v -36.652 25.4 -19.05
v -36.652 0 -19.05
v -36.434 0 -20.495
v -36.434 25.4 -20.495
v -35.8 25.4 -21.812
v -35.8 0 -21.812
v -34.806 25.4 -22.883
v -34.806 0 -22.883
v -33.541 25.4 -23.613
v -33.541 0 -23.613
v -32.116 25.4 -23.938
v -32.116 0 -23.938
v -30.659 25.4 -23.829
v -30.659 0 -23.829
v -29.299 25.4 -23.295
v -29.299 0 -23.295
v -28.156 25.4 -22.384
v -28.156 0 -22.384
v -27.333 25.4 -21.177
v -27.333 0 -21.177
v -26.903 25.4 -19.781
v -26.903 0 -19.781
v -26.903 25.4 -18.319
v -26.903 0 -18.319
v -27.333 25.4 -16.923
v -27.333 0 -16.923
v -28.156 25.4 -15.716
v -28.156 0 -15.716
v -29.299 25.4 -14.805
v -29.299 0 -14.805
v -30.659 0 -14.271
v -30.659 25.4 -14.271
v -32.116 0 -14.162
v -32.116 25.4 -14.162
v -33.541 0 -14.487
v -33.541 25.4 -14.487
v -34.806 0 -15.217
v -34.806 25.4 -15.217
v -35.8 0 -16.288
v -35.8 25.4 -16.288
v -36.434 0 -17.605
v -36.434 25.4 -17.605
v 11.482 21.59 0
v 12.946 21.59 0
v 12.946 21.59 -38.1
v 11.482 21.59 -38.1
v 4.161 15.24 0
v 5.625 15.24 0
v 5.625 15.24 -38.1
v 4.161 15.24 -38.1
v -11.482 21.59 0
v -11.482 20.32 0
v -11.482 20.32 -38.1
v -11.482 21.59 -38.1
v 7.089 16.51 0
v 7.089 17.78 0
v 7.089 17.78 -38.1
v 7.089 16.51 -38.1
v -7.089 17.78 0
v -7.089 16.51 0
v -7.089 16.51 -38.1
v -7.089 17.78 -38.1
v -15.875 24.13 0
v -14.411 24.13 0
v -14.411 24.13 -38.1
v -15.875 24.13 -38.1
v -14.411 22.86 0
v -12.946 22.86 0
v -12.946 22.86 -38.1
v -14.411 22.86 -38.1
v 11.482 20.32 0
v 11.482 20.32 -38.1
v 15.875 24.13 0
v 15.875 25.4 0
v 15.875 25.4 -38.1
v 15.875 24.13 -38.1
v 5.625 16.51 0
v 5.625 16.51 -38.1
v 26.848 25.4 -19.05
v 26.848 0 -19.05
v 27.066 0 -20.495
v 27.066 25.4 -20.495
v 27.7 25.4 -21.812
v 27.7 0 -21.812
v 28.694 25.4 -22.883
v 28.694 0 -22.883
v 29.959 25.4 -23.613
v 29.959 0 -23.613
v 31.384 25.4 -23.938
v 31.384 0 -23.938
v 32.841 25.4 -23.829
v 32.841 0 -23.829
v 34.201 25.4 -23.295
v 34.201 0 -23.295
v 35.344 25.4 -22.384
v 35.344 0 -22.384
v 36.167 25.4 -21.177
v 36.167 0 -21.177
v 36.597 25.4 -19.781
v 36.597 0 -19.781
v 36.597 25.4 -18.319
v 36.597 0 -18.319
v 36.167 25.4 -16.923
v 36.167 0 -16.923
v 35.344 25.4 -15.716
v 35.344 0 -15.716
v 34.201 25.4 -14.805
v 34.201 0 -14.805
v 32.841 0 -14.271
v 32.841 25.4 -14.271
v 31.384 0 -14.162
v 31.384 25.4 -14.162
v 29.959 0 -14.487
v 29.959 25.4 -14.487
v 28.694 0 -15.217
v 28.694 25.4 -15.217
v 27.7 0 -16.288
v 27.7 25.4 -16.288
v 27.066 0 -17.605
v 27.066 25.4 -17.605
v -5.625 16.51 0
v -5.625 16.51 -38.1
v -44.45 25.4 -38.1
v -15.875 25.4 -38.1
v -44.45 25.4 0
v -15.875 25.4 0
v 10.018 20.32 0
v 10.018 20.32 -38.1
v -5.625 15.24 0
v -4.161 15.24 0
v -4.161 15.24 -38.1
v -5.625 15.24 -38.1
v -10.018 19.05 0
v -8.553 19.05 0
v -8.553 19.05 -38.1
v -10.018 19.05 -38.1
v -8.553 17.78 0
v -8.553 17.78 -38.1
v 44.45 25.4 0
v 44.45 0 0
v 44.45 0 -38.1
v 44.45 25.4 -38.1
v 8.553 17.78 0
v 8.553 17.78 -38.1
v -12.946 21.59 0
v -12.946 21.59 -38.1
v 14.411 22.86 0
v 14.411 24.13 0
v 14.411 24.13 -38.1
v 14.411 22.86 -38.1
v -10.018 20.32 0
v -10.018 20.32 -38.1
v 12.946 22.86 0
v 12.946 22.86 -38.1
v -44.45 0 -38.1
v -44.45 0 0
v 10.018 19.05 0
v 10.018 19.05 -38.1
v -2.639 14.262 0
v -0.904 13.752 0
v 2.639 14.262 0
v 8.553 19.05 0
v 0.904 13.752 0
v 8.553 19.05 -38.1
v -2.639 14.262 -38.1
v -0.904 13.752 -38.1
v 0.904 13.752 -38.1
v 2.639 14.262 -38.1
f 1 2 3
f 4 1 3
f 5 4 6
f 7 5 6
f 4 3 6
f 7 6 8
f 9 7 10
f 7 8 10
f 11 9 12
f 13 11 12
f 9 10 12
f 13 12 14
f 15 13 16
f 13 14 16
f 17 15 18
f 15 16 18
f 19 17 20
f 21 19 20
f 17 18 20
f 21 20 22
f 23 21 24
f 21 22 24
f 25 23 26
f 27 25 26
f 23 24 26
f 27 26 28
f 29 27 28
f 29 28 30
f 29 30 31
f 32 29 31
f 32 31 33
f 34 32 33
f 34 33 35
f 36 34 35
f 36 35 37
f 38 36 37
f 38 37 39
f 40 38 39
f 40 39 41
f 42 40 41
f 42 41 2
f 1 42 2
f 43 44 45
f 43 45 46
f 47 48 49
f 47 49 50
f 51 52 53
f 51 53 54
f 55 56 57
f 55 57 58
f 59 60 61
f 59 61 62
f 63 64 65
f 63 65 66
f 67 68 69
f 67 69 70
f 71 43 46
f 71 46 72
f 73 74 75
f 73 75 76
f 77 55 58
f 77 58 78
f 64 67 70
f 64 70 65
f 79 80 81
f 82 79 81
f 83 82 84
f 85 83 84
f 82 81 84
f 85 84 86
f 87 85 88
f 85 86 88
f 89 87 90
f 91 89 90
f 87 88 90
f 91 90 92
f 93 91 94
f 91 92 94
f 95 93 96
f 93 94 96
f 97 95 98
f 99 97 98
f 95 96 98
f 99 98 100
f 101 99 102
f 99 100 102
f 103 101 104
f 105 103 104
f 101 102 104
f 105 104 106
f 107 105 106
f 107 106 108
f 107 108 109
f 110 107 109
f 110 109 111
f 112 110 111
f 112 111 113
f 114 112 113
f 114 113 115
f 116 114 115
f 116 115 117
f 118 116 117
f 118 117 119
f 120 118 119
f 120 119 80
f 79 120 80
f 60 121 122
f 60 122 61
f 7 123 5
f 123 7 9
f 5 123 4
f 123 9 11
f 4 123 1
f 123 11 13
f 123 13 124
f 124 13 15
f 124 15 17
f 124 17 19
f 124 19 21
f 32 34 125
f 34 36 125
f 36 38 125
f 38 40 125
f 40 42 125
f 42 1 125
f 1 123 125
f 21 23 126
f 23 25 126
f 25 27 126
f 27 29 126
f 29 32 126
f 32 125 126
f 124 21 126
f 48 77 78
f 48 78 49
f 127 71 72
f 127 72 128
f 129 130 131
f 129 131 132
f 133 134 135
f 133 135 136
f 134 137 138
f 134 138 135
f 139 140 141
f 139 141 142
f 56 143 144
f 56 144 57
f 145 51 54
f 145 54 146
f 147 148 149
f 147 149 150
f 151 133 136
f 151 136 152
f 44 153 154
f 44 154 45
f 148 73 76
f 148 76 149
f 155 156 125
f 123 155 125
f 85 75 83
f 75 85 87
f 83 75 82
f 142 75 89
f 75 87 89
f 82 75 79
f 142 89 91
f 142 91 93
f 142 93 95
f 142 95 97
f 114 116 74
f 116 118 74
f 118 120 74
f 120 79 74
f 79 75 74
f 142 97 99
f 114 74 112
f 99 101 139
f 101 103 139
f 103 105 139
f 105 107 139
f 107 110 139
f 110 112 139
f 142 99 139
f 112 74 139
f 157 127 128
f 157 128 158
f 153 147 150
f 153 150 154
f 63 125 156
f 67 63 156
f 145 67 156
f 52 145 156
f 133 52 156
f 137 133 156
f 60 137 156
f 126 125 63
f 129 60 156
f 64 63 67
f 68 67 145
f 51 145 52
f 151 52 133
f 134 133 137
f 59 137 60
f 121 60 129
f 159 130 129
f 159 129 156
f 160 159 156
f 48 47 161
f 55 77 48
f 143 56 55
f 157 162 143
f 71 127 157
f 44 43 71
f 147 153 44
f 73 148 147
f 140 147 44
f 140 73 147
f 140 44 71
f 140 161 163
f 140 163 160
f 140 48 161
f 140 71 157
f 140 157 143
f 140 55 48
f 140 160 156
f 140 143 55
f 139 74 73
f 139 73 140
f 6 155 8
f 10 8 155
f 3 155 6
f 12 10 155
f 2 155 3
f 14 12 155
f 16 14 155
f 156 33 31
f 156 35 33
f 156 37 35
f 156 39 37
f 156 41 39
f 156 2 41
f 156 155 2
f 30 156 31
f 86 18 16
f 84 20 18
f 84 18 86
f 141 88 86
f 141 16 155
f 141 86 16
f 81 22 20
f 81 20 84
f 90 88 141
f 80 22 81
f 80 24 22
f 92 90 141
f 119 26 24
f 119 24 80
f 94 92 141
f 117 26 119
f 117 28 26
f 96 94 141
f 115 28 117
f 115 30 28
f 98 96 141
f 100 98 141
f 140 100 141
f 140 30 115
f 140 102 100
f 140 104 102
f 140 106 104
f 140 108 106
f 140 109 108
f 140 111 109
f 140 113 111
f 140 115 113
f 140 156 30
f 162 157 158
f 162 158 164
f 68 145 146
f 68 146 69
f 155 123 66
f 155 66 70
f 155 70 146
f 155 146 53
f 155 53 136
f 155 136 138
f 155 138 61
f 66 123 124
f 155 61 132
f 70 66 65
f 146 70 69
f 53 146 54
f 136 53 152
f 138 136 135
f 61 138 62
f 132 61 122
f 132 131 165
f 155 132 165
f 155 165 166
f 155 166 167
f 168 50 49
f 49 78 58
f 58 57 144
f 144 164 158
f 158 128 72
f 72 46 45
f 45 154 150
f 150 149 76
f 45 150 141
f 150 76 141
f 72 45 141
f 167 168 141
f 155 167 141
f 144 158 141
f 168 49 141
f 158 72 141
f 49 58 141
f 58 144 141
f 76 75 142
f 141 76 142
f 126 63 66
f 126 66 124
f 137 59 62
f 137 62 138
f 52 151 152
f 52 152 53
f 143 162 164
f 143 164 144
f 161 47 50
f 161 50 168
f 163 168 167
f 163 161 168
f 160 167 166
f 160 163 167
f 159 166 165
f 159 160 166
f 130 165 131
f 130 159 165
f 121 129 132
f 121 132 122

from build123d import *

# Parameters (mm, degrees)
SKETCH1_W               = 88.9
SKETCH1_H               = 25.4
BOSS_EXTRUDE1_DEPTH     = 38.1
CUT_EXTRUDE1_REACH      = 40.1
F_3_8_CLEARANCE_HOLE1_D = 9.8044


with BuildPart() as part:
    # Sketch1 → Boss-Extrude1 (new body)
    with BuildSketch(Plane.XY):
        with Locations((0, 12.7)):
            Rectangle(SKETCH1_W, SKETCH1_H)
    extrude(amount=-BOSS_EXTRUDE1_DEPTH)

    # Sketch2 → Cut-Extrude1 (cut, up to next)
    with BuildSketch(Plane.XY, mode=Mode.PRIVATE) as cut_extrude1_sk1:
        with BuildLine():
            Line((-15.875, 25.4), (0, 25.4))
            Line((0, 25.4), (15.875, 25.4))
            Line((15.875, 25.4), (15.875, 24.13))
            Line((15.875, 24.13), (14.410694861, 24.13))
            Line((14.410694861, 24.13), (14.410694861, 22.86))
            Line((14.410694861, 22.86), (12.946389723, 22.86))
            Line((12.946389723, 22.86), (12.946389723, 21.59))
            Line((12.946389723, 21.59), (11.482084584, 21.59))
            Line((11.482084584, 21.59), (11.482084584, 20.32))
            Line((11.482084584, 20.32), (10.017779445, 20.32))
            Line((10.017779445, 20.32), (10.017779445, 19.05))
            Line((10.017779445, 19.05), (8.553474306, 19.05))
            Line((8.553474306, 19.05), (8.553474306, 17.78))
            Line((8.553474306, 17.78), (7.089169168, 17.78))
            Line((7.089169168, 17.78), (7.089169168, 16.51))
            Line((7.089169168, 16.51), (5.624864029, 16.51))
            Line((5.624864029, 16.51), (5.624864029, 15.24))
            Line((5.624864029, 15.24), (4.16055889, 15.24))
            ThreePointArc((4.16055889, 15.24), (0, 13.687108475), (-4.16055889, 15.24))
            Line((-4.16055889, 15.24), (-5.624864029, 15.24))
            Line((-5.624864029, 15.24), (-5.624864029, 16.51))
            Line((-5.624864029, 16.51), (-7.089169168, 16.51))
            Line((-7.089169168, 16.51), (-7.089169168, 17.78))
            Line((-7.089169168, 17.78), (-8.553474306, 17.78))
            Line((-8.553474306, 17.78), (-8.553474306, 19.05))
            Line((-8.553474306, 19.05), (-10.017779445, 19.05))
            Line((-10.017779445, 19.05), (-10.017779445, 20.32))
            Line((-10.017779445, 20.32), (-11.482084584, 20.32))
            Line((-11.482084584, 20.32), (-11.482084584, 21.59))
            Line((-11.482084584, 21.59), (-12.946389723, 21.59))
            Line((-12.946389723, 21.59), (-12.946389723, 22.86))
            Line((-12.946389723, 22.86), (-14.410694861, 22.86))
            Line((-14.410694861, 22.86), (-14.410694861, 24.13))
            Line((-14.410694861, 24.13), (-15.875, 24.13))
            Line((-15.875, 24.13), (-15.875, 25.4))
        make_face()
    cut_extrude1_tool1 = extrude(cut_extrude1_sk1.sketch, amount=-CUT_EXTRUDE1_REACH, mode=Mode.PRIVATE) & part.part
    add(cut_extrude1_tool1.solids().sort_by_distance((0, 20.970592, 0))[0], mode=Mode.SUBTRACT)

    # 3/8 Clearance Hole1 (through all)
    with Locations(Plane(origin=(0, 25.4, 0), x_dir=(1, 0, 0), z_dir=(0, 1, 0))):
        with Locations((-31.75, 19.05), (31.75, 19.05)):
            Hole(F_3_8_CLEARANCE_HOLE1_D / 2)


solid = part.part
